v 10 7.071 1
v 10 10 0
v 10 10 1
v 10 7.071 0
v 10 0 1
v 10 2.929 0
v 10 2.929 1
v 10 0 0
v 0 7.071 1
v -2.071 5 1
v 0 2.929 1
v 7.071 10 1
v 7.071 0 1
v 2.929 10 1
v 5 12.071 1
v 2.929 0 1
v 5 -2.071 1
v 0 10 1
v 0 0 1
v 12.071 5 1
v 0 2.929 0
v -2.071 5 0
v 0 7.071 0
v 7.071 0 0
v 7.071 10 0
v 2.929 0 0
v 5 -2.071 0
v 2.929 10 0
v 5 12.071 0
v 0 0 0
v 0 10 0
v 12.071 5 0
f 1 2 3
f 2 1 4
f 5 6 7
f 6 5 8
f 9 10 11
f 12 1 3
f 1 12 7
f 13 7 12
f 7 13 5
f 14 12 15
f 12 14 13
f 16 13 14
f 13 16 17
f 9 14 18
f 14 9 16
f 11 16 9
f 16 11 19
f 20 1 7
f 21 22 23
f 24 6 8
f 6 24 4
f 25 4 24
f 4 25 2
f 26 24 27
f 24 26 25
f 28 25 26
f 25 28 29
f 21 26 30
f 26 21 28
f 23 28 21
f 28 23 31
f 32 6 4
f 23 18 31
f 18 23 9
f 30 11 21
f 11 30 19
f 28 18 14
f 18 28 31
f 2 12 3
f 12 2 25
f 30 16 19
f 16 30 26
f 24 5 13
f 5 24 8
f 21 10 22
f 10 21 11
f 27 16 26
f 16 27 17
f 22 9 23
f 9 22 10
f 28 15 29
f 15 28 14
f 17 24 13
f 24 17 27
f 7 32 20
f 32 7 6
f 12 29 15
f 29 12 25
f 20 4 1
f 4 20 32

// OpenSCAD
/// This is pulled from stackoverflow
/// https://stackoverflow.com/questions/45826208/openscad-rotating-around-a-particular-point


// rotate as per a, v, but around point pt
module rotate_about_pt(a, v, pt) {
    translate(pt)
        rotate(a,v)
            translate(-pt)
                children();   
}

color("Red")cube([10,10,1]);
rotate_about_pt(45,0,[5,5,0]) cube([10,10,1]);
